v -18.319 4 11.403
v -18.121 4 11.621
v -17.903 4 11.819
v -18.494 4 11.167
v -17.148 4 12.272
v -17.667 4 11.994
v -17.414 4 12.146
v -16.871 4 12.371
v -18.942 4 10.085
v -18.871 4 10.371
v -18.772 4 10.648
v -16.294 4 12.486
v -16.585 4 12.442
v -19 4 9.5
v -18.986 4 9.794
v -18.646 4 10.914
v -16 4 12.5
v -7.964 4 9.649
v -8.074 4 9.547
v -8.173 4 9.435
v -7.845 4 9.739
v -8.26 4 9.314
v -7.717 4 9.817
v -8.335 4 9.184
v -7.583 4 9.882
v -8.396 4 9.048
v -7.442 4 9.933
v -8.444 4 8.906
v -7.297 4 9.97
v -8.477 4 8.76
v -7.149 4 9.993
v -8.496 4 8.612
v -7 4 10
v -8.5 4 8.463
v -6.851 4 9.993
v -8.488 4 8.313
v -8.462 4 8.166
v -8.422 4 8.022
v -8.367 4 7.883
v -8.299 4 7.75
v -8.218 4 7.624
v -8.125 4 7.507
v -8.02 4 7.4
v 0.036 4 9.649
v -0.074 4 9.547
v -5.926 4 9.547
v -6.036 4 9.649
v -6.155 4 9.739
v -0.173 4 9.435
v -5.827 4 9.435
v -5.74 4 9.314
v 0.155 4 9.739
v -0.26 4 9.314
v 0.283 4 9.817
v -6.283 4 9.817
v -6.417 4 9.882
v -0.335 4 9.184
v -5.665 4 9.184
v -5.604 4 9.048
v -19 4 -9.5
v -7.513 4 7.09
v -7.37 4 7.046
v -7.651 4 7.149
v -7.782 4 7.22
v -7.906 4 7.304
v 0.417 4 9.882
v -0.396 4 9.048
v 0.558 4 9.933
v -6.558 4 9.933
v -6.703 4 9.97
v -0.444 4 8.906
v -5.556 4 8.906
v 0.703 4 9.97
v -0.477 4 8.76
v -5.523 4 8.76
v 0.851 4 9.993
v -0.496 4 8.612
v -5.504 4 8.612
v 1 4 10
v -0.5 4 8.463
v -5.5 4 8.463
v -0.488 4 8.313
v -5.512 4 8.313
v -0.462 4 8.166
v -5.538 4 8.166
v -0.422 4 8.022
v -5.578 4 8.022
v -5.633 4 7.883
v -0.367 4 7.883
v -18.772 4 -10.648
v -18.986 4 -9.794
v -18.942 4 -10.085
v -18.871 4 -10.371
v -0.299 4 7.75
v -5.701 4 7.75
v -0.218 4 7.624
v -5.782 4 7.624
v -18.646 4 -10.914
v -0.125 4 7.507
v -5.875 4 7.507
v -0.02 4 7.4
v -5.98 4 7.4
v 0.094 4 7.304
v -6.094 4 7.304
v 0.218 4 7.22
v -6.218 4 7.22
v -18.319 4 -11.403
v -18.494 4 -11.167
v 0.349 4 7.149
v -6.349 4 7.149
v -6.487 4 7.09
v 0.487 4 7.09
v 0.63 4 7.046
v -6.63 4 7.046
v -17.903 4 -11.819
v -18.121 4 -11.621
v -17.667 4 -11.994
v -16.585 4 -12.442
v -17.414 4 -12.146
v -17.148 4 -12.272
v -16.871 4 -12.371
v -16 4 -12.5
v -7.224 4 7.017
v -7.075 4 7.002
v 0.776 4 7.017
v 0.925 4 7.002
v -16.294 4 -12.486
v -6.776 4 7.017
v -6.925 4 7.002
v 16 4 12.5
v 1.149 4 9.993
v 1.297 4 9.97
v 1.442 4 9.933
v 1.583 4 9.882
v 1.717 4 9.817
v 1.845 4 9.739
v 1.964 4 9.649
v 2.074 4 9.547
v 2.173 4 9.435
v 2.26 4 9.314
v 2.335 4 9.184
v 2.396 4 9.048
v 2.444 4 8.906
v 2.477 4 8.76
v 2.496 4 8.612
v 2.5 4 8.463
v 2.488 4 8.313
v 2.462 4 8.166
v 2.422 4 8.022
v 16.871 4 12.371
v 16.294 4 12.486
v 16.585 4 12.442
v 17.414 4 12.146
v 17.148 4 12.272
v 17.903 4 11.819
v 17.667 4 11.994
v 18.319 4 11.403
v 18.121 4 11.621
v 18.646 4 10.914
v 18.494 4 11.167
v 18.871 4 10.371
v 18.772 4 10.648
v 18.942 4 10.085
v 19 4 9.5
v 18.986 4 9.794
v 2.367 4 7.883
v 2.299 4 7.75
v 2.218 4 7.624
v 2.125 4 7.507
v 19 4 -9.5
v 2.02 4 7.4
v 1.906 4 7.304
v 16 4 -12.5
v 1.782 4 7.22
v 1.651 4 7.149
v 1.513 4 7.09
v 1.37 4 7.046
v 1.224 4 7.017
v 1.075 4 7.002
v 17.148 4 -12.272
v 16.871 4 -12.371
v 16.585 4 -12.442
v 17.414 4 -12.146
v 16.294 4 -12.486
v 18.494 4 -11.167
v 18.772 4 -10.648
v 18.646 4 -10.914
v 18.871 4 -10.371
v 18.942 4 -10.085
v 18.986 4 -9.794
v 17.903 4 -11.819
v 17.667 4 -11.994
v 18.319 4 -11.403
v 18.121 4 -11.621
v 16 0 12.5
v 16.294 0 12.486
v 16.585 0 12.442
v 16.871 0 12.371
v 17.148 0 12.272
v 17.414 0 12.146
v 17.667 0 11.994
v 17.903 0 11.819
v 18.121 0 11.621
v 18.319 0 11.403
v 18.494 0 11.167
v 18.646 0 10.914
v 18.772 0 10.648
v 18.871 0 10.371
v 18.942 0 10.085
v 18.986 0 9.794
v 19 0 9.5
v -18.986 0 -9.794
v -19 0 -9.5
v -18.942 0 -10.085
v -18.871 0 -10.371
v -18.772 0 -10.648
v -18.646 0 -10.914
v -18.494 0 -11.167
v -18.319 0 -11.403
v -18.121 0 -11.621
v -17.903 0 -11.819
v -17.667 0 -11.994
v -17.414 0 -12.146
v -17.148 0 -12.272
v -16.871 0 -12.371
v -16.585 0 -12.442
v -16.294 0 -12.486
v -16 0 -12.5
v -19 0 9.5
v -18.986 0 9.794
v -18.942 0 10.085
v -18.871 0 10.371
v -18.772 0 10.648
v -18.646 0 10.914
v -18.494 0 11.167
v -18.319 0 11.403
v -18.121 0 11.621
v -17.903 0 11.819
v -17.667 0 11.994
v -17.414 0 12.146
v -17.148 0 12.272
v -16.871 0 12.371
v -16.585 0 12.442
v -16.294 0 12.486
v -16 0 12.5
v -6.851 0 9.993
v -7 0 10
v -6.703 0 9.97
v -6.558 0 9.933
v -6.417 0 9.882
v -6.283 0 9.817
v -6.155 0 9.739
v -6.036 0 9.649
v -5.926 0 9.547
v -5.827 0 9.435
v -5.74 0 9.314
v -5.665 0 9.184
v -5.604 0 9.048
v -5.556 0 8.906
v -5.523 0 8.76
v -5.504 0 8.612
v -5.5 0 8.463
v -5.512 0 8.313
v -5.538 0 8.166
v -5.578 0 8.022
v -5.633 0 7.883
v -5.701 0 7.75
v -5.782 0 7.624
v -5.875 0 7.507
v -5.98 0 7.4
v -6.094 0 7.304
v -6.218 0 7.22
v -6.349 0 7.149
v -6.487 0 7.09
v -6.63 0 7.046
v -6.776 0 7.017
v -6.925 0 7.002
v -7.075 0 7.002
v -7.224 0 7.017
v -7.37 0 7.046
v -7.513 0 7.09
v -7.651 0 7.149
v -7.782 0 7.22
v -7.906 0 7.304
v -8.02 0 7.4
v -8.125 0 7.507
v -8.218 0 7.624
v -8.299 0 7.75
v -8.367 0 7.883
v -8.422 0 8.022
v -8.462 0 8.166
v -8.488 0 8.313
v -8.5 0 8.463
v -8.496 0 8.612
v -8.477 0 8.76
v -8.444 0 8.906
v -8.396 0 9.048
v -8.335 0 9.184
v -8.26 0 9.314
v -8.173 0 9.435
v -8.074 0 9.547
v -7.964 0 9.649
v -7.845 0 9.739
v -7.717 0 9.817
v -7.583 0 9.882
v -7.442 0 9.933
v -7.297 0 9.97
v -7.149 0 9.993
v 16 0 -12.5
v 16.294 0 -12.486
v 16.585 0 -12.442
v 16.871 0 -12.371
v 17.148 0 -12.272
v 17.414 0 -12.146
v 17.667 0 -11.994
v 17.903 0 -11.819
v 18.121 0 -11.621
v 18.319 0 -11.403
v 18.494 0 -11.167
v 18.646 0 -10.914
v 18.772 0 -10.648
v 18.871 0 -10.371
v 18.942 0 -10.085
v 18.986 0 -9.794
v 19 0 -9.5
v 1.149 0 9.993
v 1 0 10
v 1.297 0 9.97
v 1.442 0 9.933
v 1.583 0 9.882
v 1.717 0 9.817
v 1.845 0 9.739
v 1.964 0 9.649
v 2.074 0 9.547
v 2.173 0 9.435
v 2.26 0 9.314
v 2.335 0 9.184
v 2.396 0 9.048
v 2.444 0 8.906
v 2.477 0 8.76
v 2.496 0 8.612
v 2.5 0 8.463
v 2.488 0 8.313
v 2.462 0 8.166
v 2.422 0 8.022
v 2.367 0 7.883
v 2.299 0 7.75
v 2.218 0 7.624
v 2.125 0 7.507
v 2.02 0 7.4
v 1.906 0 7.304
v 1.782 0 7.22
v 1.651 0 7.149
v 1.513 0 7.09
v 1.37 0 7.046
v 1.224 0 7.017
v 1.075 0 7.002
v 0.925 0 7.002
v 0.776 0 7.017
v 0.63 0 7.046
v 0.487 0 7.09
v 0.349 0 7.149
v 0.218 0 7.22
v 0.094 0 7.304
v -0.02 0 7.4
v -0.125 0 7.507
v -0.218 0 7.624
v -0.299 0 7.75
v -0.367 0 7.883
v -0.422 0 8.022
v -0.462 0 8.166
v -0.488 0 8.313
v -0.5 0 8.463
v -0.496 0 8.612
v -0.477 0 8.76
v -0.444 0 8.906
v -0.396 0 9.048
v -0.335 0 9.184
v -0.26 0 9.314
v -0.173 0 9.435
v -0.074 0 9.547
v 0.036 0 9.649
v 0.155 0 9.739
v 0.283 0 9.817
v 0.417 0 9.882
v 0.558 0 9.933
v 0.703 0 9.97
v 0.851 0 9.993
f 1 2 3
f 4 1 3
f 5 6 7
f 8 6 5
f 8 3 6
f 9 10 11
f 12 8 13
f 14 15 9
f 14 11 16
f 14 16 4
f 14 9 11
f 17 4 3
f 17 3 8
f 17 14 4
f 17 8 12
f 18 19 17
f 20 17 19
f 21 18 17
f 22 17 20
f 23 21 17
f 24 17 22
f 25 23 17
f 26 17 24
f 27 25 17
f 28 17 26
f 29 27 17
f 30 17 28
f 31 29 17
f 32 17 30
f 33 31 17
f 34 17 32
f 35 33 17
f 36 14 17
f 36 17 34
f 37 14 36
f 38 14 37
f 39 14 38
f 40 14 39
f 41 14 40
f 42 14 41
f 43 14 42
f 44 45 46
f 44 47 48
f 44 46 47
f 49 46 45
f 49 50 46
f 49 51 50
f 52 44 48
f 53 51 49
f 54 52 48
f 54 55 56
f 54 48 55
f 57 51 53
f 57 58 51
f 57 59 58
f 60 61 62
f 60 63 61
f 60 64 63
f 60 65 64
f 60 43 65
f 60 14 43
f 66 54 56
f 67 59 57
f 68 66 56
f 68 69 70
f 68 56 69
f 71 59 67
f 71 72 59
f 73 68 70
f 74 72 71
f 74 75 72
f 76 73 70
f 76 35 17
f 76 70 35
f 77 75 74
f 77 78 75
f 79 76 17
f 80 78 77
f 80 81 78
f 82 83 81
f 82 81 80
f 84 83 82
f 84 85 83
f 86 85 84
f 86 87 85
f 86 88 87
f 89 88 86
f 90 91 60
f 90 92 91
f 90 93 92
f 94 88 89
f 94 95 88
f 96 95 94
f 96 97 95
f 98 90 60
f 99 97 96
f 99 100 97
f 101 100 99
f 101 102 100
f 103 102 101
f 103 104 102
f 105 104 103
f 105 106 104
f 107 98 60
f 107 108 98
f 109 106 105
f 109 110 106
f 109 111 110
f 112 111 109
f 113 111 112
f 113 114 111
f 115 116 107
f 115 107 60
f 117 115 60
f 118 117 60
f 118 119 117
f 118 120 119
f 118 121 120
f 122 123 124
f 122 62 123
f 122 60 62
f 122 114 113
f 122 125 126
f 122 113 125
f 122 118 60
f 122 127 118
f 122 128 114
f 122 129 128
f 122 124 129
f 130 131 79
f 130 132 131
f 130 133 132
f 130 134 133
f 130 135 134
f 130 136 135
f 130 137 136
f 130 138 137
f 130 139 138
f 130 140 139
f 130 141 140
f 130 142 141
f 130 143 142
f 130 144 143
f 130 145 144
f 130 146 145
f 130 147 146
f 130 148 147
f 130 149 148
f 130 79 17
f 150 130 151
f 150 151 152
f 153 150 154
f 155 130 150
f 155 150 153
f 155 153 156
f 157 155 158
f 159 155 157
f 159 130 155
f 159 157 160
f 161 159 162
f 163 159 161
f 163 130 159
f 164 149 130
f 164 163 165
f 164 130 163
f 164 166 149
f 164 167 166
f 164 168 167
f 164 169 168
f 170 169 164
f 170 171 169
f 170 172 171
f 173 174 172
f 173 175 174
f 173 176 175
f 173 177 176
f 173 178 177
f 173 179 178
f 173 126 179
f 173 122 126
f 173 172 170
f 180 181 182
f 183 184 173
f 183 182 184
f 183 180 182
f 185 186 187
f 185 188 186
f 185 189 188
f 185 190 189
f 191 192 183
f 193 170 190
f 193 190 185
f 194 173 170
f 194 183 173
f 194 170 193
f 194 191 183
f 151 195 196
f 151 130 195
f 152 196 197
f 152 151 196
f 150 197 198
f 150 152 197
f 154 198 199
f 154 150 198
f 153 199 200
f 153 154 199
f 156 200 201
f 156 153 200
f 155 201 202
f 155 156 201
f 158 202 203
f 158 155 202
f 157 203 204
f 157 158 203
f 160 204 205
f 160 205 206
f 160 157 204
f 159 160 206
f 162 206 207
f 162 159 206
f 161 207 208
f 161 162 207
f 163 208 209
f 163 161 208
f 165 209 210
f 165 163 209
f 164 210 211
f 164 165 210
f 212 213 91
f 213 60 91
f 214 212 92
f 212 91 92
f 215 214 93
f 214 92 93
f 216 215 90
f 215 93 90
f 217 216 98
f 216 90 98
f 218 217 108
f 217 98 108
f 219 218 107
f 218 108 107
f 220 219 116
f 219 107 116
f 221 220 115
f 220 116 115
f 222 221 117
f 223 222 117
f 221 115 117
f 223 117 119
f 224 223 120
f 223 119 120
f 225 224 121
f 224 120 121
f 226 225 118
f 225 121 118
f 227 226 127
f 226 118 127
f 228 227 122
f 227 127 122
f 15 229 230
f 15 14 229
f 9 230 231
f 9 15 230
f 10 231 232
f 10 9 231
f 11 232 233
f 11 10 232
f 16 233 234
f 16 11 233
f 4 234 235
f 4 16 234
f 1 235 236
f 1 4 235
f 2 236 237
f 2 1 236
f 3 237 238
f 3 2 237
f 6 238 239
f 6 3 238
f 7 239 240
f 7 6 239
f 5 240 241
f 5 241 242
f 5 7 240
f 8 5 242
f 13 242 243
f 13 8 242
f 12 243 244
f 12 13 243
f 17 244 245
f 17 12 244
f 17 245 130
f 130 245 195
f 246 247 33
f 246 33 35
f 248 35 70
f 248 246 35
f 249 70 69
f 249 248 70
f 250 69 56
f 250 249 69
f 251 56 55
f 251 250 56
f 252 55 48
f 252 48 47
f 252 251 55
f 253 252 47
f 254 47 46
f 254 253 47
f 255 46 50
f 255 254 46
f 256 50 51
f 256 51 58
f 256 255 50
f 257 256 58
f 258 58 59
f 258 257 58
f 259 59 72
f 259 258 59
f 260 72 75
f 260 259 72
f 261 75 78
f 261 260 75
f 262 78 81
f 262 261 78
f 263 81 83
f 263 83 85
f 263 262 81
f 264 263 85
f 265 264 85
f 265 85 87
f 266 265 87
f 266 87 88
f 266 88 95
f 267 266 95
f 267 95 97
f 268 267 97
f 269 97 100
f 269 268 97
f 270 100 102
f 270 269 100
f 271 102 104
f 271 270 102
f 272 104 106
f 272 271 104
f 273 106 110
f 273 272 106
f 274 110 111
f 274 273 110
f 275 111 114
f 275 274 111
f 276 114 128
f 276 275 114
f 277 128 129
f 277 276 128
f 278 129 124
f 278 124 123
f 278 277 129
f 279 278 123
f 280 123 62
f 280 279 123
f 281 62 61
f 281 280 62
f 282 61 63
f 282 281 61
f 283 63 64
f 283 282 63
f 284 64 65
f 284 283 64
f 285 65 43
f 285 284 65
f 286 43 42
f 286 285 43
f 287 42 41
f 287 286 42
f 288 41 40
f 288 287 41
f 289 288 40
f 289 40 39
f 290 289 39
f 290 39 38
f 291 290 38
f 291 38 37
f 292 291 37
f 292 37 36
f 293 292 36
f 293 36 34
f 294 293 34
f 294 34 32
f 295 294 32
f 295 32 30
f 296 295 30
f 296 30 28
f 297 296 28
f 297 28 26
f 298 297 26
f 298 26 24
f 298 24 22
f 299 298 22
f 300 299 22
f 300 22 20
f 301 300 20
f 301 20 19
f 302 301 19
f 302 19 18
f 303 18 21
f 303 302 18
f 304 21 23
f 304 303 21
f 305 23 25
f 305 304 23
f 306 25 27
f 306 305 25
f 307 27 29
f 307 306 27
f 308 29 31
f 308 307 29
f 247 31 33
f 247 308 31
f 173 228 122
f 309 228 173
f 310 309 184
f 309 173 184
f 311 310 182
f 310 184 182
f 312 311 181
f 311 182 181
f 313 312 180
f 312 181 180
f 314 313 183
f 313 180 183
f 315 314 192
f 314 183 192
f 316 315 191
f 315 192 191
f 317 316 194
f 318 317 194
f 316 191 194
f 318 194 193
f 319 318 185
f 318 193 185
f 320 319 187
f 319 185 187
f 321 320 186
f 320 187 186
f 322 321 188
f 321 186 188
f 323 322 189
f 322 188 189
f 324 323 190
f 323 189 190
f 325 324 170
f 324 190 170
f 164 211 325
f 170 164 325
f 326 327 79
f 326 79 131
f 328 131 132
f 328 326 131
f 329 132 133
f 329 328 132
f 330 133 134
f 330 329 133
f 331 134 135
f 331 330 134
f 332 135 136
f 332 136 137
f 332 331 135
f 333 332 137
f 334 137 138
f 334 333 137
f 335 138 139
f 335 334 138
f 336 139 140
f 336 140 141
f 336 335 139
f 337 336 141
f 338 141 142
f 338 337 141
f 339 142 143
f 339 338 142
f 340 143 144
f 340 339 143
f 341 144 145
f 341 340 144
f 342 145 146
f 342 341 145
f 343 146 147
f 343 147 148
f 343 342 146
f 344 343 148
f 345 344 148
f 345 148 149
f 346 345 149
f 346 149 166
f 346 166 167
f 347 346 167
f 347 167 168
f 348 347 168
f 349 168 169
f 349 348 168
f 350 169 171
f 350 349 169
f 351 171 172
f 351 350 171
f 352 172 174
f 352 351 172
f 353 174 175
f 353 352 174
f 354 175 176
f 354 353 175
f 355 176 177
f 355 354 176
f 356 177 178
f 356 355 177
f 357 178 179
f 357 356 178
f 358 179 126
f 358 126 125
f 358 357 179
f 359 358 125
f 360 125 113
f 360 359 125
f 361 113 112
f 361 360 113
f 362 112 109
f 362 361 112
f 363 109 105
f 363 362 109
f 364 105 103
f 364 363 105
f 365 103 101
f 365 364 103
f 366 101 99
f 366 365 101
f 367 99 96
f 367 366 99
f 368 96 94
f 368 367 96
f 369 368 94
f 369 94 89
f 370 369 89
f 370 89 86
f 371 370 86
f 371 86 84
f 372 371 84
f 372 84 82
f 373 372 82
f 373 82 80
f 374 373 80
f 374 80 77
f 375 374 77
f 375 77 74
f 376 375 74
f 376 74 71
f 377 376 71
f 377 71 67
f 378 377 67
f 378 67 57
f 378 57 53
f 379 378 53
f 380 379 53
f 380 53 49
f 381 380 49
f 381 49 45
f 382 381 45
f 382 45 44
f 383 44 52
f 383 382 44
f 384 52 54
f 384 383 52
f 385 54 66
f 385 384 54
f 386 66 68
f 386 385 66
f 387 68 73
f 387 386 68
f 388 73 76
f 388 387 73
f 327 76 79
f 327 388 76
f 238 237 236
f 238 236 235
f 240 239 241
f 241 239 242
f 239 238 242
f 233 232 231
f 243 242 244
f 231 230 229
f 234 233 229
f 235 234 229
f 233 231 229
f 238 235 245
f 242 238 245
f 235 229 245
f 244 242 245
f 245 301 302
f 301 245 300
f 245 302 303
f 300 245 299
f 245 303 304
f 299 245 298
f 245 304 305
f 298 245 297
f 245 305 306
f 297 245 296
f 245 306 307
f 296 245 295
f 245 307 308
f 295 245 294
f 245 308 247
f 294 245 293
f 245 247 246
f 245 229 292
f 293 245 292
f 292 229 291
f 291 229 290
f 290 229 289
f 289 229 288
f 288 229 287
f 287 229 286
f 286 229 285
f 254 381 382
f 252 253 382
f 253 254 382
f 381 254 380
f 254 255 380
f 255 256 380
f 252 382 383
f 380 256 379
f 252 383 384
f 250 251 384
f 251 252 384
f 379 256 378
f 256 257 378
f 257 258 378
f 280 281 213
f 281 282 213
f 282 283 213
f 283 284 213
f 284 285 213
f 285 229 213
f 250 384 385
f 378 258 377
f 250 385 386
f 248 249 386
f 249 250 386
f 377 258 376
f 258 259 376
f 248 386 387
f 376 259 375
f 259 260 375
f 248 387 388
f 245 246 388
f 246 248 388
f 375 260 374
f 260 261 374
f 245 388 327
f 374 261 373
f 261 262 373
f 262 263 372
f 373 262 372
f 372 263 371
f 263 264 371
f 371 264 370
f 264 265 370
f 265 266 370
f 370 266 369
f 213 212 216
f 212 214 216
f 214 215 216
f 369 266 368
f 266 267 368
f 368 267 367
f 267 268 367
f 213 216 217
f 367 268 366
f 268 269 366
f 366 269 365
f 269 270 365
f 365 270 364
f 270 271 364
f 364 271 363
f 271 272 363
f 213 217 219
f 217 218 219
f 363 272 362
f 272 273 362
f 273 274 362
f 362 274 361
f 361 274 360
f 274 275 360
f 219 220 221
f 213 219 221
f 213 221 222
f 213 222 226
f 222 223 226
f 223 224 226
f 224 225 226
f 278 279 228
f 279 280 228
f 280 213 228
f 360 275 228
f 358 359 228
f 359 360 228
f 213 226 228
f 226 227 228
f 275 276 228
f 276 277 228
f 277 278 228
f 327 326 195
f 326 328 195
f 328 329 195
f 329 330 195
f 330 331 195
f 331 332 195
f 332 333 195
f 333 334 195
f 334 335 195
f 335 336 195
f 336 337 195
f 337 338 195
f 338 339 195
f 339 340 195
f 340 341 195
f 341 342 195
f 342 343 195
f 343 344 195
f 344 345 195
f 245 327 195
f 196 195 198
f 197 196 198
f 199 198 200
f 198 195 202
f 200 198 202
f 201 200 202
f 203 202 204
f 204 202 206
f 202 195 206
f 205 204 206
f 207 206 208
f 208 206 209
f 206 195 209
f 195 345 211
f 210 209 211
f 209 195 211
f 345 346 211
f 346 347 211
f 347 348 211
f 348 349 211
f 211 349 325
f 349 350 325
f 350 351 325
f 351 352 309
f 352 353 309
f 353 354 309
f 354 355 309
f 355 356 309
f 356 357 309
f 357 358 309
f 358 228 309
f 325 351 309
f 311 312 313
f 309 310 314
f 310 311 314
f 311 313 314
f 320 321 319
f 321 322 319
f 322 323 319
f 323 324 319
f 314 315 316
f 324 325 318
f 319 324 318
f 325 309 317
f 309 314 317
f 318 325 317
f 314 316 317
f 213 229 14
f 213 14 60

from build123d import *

# Parameters (mm, degrees)
SKETCH_1_W      = 38
SKETCH_1_H      = 25
SKETCH_1_R      = 1.5
EXTRUDE_1_DEPTH = 4
FILLET_1_R      = 3


with BuildPart() as part:
    # 草图1 → 凸台-拉伸1 (new body)
    with BuildSketch(Plane(origin=(0, 0, 0), x_dir=(1, 0, 0), z_dir=(0, 1, 0))):
        Rectangle(SKETCH_1_W, SKETCH_1_H)
        with Locations(Location((-7, -8.5, 0), (0, 0, 270))):
            Circle(SKETCH_1_R, mode=Mode.SUBTRACT)
        with Locations(Location((1, -8.5, 0), (0, 0, 270))):
            Circle(SKETCH_1_R, mode=Mode.SUBTRACT)
    extrude(amount=EXTRUDE_1_DEPTH)

    # 圆角1
    fillet_1_edges = [part.edges().sort_by_distance(p)[0] for p in [
        (-19, 2, 12.5),
        (-19, 2, -12.5),
        (19, 2, -12.5),
        (19, 2, 12.5),
    ]]
    fillet(fillet_1_edges, radius=FILLET_1_R)


solid = part.part
